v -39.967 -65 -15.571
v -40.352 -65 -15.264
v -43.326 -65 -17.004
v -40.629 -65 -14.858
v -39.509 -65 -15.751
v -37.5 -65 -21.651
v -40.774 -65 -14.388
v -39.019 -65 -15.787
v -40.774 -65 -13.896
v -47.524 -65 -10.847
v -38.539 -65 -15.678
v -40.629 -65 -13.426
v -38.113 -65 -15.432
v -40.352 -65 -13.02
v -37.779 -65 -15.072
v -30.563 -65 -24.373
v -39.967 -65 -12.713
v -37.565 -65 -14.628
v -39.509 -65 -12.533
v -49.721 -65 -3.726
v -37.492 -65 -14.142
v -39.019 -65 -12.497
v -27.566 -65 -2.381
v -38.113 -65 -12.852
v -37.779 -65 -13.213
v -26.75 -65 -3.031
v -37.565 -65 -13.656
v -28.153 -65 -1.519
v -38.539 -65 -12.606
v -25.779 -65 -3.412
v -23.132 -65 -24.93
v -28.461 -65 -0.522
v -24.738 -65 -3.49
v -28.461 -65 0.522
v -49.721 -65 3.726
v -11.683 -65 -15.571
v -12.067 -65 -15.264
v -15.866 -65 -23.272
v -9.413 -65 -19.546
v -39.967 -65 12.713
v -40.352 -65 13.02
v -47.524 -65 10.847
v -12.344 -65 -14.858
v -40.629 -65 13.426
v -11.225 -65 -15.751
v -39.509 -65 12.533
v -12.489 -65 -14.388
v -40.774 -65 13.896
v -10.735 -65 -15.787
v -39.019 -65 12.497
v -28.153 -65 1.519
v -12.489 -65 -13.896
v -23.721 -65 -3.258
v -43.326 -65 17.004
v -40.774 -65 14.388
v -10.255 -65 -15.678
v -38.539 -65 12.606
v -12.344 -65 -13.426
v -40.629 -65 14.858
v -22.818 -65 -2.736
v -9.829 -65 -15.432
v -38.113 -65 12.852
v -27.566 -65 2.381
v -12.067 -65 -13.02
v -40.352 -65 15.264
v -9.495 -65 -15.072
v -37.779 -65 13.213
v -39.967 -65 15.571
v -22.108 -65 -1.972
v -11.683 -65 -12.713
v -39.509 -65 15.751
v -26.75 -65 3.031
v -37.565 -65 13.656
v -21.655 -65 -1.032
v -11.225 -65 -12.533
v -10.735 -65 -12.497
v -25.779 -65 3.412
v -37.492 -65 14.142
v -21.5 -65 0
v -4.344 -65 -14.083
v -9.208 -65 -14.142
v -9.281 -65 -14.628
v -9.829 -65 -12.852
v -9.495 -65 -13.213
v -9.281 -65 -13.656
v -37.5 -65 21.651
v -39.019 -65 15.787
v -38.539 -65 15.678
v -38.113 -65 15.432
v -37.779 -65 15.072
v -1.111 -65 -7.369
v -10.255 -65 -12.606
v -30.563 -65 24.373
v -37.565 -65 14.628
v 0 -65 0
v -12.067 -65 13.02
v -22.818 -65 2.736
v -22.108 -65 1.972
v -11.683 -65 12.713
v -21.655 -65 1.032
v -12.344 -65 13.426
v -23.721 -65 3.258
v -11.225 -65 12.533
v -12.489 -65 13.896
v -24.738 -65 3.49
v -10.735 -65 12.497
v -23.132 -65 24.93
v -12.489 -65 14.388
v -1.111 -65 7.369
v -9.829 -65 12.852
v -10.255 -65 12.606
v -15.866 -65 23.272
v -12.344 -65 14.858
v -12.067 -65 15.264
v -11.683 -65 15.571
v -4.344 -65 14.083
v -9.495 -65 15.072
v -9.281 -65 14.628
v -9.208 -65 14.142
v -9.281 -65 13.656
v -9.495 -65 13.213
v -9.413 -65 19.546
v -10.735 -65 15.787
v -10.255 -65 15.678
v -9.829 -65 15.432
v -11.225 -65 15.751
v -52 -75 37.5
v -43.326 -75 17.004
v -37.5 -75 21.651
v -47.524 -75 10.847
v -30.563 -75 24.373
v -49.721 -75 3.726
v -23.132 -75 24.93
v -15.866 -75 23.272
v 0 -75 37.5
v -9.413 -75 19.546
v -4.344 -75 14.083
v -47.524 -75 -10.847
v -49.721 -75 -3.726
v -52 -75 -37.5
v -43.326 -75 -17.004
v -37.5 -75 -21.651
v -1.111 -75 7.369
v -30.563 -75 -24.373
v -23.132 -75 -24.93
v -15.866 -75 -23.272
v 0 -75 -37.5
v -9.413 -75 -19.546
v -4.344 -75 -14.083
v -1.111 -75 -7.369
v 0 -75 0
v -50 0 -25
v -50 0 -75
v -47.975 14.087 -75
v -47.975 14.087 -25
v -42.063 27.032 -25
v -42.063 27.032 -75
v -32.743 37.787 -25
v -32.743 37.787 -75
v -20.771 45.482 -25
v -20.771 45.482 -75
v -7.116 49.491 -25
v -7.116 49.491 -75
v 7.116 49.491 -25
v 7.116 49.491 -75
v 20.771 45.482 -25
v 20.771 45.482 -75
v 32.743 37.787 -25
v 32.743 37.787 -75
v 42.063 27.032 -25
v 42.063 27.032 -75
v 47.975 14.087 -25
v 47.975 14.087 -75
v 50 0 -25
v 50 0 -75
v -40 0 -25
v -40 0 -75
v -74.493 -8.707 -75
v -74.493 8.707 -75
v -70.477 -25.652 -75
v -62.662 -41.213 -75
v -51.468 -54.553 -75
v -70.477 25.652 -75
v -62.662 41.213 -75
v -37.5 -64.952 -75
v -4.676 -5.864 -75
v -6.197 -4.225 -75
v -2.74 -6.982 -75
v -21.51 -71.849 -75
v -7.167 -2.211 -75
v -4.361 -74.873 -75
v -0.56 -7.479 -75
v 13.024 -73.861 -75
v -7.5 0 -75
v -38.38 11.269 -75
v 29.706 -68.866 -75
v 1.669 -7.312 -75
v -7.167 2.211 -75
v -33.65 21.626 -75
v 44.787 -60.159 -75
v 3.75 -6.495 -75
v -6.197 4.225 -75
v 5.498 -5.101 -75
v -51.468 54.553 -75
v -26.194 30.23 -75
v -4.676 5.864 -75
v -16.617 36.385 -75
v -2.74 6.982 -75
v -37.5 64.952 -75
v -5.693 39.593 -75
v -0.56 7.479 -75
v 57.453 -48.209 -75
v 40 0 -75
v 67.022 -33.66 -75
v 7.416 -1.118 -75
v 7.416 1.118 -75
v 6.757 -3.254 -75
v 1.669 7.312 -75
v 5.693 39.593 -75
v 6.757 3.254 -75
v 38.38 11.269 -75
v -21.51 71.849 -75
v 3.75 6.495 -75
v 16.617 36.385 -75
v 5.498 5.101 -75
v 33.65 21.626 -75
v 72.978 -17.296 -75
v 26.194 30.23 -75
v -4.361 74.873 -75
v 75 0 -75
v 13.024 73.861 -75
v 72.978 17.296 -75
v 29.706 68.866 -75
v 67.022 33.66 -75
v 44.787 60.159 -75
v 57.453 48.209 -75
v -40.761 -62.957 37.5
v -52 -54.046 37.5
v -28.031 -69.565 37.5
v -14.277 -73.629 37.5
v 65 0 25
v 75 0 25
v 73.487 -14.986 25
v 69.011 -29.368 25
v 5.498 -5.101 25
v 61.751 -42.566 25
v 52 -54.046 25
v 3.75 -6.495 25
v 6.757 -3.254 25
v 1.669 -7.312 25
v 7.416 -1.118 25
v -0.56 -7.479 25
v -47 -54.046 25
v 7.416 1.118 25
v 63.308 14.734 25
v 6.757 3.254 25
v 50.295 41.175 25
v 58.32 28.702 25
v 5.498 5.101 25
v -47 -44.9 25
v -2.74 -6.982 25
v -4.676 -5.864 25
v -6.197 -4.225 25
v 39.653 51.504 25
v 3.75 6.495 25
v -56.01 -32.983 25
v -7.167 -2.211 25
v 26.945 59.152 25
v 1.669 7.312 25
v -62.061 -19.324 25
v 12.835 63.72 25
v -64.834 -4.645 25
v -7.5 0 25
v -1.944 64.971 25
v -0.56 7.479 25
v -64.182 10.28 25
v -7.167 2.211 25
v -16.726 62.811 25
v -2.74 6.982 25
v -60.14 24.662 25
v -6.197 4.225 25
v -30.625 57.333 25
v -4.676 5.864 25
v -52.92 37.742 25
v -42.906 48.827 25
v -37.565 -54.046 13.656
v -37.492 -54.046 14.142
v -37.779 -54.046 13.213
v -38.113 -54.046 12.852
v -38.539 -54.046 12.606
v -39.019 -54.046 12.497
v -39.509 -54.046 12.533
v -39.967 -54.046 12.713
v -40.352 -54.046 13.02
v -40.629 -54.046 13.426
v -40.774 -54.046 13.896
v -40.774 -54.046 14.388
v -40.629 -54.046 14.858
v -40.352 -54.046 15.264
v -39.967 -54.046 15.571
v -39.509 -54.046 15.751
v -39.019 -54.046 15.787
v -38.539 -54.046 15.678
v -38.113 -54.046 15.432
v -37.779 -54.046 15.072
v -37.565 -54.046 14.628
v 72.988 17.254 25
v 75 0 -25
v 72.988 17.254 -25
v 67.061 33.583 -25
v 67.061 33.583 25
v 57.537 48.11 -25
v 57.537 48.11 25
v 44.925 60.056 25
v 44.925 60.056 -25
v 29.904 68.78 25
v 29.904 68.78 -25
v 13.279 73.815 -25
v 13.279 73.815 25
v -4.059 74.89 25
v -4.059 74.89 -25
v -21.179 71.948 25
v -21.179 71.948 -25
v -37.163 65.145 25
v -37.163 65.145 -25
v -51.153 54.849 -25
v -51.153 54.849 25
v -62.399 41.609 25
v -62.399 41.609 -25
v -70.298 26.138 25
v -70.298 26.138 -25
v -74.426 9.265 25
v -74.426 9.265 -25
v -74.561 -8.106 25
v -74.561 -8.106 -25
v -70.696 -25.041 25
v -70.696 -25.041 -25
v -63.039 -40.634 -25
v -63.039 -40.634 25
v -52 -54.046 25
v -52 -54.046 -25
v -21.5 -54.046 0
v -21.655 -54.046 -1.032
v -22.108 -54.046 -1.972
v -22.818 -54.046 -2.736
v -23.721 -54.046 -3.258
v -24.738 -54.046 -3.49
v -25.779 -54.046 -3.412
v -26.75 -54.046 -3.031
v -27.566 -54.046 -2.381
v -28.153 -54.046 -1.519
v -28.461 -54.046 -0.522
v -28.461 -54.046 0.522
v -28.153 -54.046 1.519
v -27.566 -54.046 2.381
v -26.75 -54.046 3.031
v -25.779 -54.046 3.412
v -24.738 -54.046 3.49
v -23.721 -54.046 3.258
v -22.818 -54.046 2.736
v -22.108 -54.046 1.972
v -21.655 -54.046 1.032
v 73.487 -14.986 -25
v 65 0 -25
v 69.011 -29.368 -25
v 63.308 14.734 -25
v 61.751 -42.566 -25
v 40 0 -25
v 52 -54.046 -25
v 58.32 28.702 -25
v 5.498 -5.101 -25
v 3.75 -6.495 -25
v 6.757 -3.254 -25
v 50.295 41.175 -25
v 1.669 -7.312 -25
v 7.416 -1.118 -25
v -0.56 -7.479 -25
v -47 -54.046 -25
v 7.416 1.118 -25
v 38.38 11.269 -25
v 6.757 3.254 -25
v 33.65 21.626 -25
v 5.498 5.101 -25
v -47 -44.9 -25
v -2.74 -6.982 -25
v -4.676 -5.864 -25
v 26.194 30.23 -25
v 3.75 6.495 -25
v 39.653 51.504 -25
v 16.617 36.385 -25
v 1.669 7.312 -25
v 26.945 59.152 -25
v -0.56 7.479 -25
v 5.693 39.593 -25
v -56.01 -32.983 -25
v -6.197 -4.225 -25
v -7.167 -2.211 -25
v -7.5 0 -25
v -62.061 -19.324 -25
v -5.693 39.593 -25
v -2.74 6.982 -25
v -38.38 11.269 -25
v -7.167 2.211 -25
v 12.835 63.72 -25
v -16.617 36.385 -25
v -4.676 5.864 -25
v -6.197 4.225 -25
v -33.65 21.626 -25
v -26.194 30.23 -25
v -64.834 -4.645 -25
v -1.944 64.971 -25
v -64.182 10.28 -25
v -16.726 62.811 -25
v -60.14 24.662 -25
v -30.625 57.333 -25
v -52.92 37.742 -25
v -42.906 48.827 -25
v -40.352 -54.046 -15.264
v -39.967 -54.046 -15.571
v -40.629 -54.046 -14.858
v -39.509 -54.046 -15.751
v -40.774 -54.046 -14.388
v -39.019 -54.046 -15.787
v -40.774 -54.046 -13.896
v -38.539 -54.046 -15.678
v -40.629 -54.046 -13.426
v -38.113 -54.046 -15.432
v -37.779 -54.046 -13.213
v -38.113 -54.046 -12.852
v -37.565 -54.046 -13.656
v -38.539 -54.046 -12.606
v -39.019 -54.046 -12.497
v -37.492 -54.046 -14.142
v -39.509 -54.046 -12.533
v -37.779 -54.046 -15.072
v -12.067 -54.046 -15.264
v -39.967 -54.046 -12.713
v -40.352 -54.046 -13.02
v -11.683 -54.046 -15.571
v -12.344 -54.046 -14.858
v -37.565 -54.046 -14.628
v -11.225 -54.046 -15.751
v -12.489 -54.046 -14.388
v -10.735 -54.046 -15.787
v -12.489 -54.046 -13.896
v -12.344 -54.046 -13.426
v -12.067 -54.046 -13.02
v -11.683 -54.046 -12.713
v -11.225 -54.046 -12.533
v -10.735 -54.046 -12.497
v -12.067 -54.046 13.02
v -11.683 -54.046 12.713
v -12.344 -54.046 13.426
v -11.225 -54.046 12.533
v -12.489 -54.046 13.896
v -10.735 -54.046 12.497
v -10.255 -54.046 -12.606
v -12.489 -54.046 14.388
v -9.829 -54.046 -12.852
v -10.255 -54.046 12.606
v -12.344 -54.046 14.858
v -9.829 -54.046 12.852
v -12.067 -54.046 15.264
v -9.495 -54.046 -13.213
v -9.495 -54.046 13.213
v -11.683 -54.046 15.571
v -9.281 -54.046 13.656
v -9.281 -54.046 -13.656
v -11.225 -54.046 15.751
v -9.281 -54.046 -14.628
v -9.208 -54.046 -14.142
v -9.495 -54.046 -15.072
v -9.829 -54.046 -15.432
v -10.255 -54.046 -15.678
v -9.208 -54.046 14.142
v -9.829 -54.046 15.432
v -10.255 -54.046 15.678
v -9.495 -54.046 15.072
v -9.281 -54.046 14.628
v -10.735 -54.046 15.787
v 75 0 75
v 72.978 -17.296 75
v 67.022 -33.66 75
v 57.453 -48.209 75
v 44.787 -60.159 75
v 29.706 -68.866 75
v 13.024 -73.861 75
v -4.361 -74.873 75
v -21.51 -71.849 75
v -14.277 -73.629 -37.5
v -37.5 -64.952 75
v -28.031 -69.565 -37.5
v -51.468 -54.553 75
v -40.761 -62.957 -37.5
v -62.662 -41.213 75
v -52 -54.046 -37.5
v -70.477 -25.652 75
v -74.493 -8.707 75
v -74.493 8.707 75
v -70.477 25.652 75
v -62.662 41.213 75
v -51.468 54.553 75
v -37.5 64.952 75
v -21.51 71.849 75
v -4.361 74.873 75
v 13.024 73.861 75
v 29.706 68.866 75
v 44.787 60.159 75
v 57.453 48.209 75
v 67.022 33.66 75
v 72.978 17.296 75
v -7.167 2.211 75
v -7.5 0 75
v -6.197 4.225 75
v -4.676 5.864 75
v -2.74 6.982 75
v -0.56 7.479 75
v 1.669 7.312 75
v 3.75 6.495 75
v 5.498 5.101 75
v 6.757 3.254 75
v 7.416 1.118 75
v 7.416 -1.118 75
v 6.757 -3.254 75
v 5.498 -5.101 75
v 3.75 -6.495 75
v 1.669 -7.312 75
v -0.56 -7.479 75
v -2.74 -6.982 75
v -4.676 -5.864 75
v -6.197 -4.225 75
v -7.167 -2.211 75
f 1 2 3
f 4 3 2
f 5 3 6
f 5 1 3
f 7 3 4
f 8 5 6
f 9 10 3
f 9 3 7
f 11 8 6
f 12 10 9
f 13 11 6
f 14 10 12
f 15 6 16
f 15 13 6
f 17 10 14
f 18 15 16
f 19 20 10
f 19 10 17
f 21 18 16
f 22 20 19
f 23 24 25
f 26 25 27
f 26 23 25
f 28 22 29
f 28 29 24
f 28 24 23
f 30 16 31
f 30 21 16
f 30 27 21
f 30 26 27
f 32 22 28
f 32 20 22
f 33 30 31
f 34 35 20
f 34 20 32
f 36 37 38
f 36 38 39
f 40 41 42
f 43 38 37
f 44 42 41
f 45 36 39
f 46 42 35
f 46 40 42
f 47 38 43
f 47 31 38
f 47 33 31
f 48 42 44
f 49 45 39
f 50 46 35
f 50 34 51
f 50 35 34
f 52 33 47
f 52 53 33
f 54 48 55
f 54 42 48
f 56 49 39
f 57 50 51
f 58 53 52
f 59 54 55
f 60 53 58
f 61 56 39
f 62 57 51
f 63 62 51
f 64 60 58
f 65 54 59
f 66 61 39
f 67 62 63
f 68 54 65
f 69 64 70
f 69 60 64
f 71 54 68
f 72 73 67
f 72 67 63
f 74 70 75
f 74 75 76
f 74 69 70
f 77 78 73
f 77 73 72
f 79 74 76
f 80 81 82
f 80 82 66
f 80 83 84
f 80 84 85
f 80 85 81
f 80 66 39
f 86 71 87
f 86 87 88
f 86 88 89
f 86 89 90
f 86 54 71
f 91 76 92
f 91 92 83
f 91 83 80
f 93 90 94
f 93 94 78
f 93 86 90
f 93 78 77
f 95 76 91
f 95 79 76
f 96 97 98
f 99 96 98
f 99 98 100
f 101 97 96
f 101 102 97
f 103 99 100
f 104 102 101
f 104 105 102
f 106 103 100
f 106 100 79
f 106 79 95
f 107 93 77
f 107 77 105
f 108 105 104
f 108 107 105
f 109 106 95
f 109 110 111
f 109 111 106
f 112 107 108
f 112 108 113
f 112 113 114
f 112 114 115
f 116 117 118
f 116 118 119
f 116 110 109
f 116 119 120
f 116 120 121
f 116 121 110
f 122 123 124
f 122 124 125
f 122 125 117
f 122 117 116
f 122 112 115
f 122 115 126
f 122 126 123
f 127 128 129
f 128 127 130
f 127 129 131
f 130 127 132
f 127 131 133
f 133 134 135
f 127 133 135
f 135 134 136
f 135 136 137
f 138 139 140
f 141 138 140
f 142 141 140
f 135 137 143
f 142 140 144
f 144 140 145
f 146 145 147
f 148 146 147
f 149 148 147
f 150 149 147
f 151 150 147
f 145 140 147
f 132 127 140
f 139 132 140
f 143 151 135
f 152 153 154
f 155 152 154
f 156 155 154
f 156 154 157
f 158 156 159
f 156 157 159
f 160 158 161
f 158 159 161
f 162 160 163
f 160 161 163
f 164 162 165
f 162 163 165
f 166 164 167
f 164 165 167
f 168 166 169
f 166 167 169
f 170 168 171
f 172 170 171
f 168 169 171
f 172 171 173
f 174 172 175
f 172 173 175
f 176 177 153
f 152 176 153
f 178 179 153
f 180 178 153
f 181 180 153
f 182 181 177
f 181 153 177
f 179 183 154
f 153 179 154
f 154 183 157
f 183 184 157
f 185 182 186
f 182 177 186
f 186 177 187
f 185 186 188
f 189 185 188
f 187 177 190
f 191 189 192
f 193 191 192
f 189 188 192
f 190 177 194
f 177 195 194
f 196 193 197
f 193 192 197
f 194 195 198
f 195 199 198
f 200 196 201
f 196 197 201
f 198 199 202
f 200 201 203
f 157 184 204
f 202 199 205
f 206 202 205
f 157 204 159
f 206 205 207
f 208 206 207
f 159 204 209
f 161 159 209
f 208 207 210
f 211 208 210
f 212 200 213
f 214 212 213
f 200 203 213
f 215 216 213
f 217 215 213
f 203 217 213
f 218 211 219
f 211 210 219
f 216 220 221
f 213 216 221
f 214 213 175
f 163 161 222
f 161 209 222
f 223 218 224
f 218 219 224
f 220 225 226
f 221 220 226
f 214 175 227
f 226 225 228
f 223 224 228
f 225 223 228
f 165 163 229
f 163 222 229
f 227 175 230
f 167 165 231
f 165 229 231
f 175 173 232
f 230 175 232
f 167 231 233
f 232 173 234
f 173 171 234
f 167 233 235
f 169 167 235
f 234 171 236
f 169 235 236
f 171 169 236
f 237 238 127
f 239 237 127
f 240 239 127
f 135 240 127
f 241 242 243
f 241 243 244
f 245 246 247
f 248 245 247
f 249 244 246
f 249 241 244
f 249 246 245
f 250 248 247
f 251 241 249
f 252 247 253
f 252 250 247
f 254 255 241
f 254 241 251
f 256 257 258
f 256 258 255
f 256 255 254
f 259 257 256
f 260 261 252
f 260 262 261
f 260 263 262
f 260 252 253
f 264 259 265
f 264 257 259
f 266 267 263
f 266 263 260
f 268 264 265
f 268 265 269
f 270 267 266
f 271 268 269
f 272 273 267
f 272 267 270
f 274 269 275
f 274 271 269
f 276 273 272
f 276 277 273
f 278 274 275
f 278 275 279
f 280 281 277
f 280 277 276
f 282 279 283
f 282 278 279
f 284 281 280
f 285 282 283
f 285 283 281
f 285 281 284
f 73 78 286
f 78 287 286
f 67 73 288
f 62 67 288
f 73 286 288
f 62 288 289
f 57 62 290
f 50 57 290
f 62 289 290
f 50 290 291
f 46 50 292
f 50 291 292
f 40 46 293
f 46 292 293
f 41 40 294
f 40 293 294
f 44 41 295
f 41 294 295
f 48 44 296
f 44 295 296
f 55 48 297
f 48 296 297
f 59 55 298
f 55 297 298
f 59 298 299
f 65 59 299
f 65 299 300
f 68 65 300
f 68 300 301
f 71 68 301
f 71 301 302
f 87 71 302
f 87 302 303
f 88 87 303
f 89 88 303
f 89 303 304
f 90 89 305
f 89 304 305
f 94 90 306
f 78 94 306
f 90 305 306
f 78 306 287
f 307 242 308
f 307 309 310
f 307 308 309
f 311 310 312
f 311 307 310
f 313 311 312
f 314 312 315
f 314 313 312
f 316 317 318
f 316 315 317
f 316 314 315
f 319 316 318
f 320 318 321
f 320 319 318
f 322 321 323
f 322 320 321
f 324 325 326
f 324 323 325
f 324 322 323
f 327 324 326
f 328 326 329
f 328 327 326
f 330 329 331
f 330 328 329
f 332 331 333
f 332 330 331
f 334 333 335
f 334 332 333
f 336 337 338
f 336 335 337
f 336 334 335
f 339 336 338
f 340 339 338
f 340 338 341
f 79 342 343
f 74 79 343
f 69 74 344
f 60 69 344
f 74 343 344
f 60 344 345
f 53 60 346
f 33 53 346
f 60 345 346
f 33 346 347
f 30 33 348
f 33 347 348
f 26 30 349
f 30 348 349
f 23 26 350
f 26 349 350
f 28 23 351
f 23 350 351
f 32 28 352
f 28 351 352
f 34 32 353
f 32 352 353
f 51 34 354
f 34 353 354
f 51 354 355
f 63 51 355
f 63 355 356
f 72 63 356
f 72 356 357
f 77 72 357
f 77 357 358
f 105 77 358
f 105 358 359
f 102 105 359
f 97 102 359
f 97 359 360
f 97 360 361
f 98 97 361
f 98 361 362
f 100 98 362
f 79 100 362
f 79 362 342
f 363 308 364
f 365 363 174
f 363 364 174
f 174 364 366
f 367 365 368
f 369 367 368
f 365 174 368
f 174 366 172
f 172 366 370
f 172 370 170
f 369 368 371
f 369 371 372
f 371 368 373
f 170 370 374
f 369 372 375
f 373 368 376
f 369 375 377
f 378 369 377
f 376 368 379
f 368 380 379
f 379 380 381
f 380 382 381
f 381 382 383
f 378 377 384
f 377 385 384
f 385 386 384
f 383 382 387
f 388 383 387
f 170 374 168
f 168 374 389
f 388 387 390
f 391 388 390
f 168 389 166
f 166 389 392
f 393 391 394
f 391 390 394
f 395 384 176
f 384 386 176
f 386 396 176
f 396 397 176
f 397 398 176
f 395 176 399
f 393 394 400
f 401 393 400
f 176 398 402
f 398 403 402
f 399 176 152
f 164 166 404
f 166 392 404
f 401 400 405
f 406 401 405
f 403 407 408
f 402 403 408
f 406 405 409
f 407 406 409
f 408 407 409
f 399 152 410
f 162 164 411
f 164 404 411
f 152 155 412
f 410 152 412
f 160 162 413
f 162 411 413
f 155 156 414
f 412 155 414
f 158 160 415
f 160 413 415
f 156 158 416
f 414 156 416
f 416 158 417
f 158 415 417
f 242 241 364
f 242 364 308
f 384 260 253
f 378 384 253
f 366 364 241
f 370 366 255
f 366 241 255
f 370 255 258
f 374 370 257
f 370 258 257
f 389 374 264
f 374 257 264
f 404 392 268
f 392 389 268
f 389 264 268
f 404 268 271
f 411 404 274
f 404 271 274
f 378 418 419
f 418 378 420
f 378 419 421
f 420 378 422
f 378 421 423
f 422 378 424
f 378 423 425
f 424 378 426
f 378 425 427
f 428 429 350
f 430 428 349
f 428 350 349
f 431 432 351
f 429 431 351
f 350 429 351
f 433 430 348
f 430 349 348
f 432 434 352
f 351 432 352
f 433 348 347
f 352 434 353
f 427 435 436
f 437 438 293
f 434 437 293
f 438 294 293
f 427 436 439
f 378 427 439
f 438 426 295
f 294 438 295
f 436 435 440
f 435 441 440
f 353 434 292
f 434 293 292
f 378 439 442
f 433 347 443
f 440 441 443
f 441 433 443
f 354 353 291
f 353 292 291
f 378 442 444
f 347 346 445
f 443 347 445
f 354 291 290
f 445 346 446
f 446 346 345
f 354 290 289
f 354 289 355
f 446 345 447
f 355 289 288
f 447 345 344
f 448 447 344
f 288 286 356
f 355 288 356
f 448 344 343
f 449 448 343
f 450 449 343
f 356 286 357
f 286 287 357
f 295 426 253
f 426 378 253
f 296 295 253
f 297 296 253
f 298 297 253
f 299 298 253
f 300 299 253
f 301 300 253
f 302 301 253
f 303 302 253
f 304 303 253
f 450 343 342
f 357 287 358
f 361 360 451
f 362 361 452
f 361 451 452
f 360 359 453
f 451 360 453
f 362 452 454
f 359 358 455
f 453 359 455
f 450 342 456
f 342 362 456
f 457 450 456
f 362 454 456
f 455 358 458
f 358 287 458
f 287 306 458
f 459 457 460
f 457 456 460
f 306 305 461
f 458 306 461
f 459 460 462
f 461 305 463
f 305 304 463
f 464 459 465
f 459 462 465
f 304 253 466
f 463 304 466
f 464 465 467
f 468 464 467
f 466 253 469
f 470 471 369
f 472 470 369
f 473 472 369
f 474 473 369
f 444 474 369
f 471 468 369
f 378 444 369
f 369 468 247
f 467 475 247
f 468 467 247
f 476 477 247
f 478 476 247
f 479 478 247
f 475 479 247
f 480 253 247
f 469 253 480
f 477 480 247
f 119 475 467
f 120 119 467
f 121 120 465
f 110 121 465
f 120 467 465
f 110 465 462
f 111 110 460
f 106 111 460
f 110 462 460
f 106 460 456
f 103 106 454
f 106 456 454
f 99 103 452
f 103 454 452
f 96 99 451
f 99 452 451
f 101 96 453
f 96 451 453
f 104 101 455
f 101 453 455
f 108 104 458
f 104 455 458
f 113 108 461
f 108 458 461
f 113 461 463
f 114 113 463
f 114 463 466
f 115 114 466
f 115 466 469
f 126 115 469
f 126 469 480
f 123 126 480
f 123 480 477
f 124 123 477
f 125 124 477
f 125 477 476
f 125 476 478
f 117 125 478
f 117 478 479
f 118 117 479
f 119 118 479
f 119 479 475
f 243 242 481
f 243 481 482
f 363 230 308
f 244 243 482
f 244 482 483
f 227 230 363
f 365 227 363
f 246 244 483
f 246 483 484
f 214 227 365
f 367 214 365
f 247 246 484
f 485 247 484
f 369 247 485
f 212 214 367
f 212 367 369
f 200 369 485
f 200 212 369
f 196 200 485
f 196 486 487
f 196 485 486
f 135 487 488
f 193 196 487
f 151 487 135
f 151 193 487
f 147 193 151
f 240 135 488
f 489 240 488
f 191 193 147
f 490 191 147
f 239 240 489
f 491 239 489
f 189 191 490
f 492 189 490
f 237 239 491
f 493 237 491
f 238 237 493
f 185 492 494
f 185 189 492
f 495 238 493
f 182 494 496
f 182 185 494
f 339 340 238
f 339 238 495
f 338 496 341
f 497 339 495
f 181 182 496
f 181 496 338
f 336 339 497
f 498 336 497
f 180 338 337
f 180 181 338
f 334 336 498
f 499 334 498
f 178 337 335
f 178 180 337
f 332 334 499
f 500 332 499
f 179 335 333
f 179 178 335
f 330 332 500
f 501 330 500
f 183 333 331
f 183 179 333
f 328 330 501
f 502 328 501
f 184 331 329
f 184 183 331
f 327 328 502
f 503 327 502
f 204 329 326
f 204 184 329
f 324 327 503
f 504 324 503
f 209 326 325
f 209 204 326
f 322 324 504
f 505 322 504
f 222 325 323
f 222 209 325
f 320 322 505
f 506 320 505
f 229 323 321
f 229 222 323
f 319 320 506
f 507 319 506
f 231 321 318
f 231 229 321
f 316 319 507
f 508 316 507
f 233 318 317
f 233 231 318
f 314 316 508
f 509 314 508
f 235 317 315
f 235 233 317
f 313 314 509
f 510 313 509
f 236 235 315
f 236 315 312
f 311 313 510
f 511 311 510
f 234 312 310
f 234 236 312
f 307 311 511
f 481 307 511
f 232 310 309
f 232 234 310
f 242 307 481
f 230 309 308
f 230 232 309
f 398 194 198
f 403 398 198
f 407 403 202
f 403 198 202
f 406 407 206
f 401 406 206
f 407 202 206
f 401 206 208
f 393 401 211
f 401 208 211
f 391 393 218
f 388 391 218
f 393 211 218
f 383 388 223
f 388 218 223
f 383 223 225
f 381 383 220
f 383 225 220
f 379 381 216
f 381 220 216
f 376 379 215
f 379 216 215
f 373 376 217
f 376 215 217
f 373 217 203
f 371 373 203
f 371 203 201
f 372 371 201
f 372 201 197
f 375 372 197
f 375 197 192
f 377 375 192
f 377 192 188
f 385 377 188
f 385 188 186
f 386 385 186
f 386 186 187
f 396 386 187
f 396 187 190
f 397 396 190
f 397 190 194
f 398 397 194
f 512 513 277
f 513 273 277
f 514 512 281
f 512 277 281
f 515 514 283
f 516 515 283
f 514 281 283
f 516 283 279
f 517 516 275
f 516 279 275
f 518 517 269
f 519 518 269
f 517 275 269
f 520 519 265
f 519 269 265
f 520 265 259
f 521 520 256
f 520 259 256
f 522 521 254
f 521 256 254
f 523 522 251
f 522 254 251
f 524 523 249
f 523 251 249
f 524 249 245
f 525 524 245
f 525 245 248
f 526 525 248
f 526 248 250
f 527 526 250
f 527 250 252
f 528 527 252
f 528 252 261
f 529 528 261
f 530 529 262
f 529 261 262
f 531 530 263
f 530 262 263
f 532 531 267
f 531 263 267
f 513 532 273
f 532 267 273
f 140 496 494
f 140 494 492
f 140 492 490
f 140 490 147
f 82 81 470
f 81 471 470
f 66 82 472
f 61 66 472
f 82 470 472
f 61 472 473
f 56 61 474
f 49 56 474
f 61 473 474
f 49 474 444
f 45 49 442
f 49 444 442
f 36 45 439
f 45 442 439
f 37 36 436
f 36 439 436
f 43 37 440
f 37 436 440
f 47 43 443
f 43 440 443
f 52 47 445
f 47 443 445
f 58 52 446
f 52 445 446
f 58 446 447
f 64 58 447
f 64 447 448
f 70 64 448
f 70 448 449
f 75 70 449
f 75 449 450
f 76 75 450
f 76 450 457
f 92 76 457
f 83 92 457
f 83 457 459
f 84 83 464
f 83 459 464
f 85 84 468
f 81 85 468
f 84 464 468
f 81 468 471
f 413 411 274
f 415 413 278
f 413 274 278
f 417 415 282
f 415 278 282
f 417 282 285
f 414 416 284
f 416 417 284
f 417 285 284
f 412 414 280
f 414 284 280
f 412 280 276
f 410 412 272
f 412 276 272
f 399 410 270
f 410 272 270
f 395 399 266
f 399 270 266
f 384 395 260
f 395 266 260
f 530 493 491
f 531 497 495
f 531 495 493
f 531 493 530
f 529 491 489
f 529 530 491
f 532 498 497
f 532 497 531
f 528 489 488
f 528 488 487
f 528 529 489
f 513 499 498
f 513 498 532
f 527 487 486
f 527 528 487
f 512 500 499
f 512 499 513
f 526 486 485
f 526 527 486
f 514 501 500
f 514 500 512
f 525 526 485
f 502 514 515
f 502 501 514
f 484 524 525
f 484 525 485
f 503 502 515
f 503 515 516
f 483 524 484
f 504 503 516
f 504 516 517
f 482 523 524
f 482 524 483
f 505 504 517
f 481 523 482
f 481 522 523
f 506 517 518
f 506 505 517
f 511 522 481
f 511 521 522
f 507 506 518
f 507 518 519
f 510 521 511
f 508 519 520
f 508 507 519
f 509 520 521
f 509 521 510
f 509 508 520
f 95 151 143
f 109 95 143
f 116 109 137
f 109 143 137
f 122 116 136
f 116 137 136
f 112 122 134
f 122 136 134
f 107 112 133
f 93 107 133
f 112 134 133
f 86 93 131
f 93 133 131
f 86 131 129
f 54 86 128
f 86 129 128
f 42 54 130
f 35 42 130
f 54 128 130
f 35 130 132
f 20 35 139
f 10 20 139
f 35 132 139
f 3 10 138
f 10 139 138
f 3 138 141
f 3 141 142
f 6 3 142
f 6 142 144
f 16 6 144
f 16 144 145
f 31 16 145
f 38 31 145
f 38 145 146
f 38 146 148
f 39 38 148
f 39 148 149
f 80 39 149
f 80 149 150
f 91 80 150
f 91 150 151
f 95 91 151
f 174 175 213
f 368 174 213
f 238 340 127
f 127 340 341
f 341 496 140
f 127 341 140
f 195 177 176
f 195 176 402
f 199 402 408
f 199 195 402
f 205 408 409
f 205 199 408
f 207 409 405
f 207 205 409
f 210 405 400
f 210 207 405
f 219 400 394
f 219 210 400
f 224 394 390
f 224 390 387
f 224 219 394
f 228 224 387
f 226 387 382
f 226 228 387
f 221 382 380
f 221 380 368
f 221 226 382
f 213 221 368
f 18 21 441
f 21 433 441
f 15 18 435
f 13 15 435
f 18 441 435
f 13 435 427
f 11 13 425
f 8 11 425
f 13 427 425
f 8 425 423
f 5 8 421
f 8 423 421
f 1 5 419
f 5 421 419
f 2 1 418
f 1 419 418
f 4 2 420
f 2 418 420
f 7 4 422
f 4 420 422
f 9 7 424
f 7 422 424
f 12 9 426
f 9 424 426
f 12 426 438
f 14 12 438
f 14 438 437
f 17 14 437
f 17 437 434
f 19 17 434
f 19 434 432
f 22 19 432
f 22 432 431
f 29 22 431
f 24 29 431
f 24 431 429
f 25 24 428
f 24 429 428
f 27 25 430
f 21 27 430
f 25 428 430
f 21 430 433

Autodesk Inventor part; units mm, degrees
ref_plane "YZ Plane" through (0, 0, 0) normal (1, 0, 0) x (0, 1, 0)
ref_plane "XZ Plane" through (0, 0, 0) normal (0, 1, 0) x (-1, 0, 0)
sketch "Sketch1" plane through (0, 0, 0) normal (0, 0, 1) x (1, 0, 0)
  circle A0 centre (0, 0) radius 75
  dimension "d0" = 150
extrude "Extrusion1" add sketch "Sketch1" along normal mid plane 150
sketch "Sketch32" plane through (0, 0, 0) normal (0, 0, 1) x (1, 0, 0)
  line L0 (0, 0) -> (-52, 0)
  line L1 (-52, 0) -> (-52, -75)
  line L2 (-52, -75) -> (0, -75)
  line L3 (0, -75) -> (0, 0)
  dimension "d94" = 52
  dimension "d95" = 75
extrude "Extrusion23" add sketch "Sketch32" along normal mid plane 75
sketch "Sketch39" plane through (0, 0, -75) normal (0, 0, -1) x (-1, 0, 0)
  circle A0 centre (0, 0) radius 7.5
  dimension "d141" = 15
extrude "Extrusion30" cut sketch "Sketch39" against normal through all
ref_plane "Work Plane4" through (0, 0, 0) normal (0, 0, -1) x (-1, 0, 0)
sketch "Sketch40" plane through (0, 0, 0) normal (0, 0, -1) x (-1, 0, 0)
  circle A0 centre (0, 0) radius 75
  dimension "d144" = 150
extrude "Extrusion31" cut sketch "Sketch40" along normal mid plane 50
sketch "Sketch41" plane through (0, 0, 0) normal (0, 0, -1) x (-1, 0, 0)
  line L0 (52, -75) -> (52, -54.0463) projected
  line L1 (52, -54.0463) -> (-52, -54.0463)
  circle A0 centre (0, 0) radius 75 projected
  arc A1 (-52, -54.0463) -> (0, -75) centre (0, 0) ccw
extrude "Extrusion32" add sketch "Sketch41" along normal mid plane 50 contours A0 L1 picked at (-14.3807, -56.4807)
sketch "Sketch34" plane through (-52, -75, 37.5) normal (0, -1, 0) x (1, 0, 0)
  circle A0 centre (27, -37.5) radius 25
  line L0 (52, -75) -> (0, -75) projected
  line L1 (-23, -112.5) -> (127, -112.5) projected
  point P0 (52, -37.5)
  dimension "d104" = 50
  dimension "d105" = 25
  dimension "d106" = 37.5
extrude "Extrusion25" cut sketch "Sketch34" against normal blind 10
sketch "Sketch42" plane through (0, 0, 0) normal (0, 0, -1) x (-1, 0, 0)
  arc A0 (47, -44.8999) -> (1.9436, 64.9709) centre (0, 0) ccw
  line L0 (47, -44.8999) -> (47, -54.0463)
  line L1 (47, -54.0463) -> (52, -54.0463)
  arc A1 (52, -54.0463) -> (-75, 0) centre (0, 0) ccw
  arc A2 (47, -44.8999) -> (-65, 0) centre (0, 0) ccw
  line L2 (-65, 0) -> (-75, 0)
  line L3 (0, 0) -> (-92.1338, 0) construction
  dimension "d164" = 5
extrude "Extrusion33" add sketch "Sketch42" along normal mid plane 50
sketch "Sketch43" plane through (52, -54.0463, 25) normal (0, 1, 0) x (1, 0, 0)
  circle A0 centre (-77, 25) radius 25 construction
  line L0 (-62.8579, 10.8579) -> (-91.1421, 10.8579) construction
  line L1 (-91.1421, 10.8579) -> (-91.1421, 39.1421) construction
  line L2 (-91.1421, 39.1421) -> (-62.8579, 39.1421) construction
  line L3 (-62.8579, 39.1421) -> (-62.8579, 10.8579) construction
  line L4 (-62.8579, 10.8579) -> (-91.1421, 39.1421) construction
  line L5 (-91.1421, 10.8579) -> (-62.8579, 39.1421) construction
  circle A1 centre (-91.1421, 39.1421) radius 1.65
  circle A2 centre (-91.1421, 10.8579) radius 1.65
  circle A3 centre (-62.8579, 10.8579) radius 1.65
  circle A4 centre (-62.8579, 39.1421) radius 1.65
  circle A5 centre (-77, 25) radius 3.5
  line L6 (-52, 62.5) -> (-104, 62.5) projected
  line L7 (-52, 25) -> (-52, 62.5) projected
  point P0 (-75, 50)
  dimension "d154" = 50
  dimension "d155" = 28.2843
  dimension "d156" = 28.2843
  dimension "d157" = 3.3
  dimension "d158" = 3.3
  dimension "d159" = 3.3
  dimension "d160" = 3.3
  dimension "d163" = 7
  dimension "d165" = 37.5
  dimension "d166" = 25
extrude "Extrusion34" cut sketch "Sketch43" against normal through all
sketch "Sketch44" plane through (0, 0, -75) normal (0, 0, -1) x (-1, 0, 0)
  arc A0 (75, 0) -> (0, -75) centre (0, 0) ccw construction
  circle A1 centre (0, 0) radius 75 projected
  line L0 (0, 0) -> (107.3838, 0) construction
  arc A2 (50, 0) -> (-50, 0) centre (0, 0) ccw
  arc A3 (40, 0) -> (-40, 0) centre (0, 0) ccw
  line L1 (40, 0) -> (50, 0)
  line L2 (0, -55) -> (0, -55.9017)
  line L3 (-52, -54.0463) -> (47, -54.0463) projected
  line L4 (0, -75) -> (52, -75) projected
  line L5 (-50, 0) -> (-40, 0)
  dimension "d167" = 25
  dimension "d168" = 10
extrude "Extrusion35" cut sketch "Sketch44" against normal blind 50 contours L1 A3 L5 A2
properties material "ABS Plastic"
